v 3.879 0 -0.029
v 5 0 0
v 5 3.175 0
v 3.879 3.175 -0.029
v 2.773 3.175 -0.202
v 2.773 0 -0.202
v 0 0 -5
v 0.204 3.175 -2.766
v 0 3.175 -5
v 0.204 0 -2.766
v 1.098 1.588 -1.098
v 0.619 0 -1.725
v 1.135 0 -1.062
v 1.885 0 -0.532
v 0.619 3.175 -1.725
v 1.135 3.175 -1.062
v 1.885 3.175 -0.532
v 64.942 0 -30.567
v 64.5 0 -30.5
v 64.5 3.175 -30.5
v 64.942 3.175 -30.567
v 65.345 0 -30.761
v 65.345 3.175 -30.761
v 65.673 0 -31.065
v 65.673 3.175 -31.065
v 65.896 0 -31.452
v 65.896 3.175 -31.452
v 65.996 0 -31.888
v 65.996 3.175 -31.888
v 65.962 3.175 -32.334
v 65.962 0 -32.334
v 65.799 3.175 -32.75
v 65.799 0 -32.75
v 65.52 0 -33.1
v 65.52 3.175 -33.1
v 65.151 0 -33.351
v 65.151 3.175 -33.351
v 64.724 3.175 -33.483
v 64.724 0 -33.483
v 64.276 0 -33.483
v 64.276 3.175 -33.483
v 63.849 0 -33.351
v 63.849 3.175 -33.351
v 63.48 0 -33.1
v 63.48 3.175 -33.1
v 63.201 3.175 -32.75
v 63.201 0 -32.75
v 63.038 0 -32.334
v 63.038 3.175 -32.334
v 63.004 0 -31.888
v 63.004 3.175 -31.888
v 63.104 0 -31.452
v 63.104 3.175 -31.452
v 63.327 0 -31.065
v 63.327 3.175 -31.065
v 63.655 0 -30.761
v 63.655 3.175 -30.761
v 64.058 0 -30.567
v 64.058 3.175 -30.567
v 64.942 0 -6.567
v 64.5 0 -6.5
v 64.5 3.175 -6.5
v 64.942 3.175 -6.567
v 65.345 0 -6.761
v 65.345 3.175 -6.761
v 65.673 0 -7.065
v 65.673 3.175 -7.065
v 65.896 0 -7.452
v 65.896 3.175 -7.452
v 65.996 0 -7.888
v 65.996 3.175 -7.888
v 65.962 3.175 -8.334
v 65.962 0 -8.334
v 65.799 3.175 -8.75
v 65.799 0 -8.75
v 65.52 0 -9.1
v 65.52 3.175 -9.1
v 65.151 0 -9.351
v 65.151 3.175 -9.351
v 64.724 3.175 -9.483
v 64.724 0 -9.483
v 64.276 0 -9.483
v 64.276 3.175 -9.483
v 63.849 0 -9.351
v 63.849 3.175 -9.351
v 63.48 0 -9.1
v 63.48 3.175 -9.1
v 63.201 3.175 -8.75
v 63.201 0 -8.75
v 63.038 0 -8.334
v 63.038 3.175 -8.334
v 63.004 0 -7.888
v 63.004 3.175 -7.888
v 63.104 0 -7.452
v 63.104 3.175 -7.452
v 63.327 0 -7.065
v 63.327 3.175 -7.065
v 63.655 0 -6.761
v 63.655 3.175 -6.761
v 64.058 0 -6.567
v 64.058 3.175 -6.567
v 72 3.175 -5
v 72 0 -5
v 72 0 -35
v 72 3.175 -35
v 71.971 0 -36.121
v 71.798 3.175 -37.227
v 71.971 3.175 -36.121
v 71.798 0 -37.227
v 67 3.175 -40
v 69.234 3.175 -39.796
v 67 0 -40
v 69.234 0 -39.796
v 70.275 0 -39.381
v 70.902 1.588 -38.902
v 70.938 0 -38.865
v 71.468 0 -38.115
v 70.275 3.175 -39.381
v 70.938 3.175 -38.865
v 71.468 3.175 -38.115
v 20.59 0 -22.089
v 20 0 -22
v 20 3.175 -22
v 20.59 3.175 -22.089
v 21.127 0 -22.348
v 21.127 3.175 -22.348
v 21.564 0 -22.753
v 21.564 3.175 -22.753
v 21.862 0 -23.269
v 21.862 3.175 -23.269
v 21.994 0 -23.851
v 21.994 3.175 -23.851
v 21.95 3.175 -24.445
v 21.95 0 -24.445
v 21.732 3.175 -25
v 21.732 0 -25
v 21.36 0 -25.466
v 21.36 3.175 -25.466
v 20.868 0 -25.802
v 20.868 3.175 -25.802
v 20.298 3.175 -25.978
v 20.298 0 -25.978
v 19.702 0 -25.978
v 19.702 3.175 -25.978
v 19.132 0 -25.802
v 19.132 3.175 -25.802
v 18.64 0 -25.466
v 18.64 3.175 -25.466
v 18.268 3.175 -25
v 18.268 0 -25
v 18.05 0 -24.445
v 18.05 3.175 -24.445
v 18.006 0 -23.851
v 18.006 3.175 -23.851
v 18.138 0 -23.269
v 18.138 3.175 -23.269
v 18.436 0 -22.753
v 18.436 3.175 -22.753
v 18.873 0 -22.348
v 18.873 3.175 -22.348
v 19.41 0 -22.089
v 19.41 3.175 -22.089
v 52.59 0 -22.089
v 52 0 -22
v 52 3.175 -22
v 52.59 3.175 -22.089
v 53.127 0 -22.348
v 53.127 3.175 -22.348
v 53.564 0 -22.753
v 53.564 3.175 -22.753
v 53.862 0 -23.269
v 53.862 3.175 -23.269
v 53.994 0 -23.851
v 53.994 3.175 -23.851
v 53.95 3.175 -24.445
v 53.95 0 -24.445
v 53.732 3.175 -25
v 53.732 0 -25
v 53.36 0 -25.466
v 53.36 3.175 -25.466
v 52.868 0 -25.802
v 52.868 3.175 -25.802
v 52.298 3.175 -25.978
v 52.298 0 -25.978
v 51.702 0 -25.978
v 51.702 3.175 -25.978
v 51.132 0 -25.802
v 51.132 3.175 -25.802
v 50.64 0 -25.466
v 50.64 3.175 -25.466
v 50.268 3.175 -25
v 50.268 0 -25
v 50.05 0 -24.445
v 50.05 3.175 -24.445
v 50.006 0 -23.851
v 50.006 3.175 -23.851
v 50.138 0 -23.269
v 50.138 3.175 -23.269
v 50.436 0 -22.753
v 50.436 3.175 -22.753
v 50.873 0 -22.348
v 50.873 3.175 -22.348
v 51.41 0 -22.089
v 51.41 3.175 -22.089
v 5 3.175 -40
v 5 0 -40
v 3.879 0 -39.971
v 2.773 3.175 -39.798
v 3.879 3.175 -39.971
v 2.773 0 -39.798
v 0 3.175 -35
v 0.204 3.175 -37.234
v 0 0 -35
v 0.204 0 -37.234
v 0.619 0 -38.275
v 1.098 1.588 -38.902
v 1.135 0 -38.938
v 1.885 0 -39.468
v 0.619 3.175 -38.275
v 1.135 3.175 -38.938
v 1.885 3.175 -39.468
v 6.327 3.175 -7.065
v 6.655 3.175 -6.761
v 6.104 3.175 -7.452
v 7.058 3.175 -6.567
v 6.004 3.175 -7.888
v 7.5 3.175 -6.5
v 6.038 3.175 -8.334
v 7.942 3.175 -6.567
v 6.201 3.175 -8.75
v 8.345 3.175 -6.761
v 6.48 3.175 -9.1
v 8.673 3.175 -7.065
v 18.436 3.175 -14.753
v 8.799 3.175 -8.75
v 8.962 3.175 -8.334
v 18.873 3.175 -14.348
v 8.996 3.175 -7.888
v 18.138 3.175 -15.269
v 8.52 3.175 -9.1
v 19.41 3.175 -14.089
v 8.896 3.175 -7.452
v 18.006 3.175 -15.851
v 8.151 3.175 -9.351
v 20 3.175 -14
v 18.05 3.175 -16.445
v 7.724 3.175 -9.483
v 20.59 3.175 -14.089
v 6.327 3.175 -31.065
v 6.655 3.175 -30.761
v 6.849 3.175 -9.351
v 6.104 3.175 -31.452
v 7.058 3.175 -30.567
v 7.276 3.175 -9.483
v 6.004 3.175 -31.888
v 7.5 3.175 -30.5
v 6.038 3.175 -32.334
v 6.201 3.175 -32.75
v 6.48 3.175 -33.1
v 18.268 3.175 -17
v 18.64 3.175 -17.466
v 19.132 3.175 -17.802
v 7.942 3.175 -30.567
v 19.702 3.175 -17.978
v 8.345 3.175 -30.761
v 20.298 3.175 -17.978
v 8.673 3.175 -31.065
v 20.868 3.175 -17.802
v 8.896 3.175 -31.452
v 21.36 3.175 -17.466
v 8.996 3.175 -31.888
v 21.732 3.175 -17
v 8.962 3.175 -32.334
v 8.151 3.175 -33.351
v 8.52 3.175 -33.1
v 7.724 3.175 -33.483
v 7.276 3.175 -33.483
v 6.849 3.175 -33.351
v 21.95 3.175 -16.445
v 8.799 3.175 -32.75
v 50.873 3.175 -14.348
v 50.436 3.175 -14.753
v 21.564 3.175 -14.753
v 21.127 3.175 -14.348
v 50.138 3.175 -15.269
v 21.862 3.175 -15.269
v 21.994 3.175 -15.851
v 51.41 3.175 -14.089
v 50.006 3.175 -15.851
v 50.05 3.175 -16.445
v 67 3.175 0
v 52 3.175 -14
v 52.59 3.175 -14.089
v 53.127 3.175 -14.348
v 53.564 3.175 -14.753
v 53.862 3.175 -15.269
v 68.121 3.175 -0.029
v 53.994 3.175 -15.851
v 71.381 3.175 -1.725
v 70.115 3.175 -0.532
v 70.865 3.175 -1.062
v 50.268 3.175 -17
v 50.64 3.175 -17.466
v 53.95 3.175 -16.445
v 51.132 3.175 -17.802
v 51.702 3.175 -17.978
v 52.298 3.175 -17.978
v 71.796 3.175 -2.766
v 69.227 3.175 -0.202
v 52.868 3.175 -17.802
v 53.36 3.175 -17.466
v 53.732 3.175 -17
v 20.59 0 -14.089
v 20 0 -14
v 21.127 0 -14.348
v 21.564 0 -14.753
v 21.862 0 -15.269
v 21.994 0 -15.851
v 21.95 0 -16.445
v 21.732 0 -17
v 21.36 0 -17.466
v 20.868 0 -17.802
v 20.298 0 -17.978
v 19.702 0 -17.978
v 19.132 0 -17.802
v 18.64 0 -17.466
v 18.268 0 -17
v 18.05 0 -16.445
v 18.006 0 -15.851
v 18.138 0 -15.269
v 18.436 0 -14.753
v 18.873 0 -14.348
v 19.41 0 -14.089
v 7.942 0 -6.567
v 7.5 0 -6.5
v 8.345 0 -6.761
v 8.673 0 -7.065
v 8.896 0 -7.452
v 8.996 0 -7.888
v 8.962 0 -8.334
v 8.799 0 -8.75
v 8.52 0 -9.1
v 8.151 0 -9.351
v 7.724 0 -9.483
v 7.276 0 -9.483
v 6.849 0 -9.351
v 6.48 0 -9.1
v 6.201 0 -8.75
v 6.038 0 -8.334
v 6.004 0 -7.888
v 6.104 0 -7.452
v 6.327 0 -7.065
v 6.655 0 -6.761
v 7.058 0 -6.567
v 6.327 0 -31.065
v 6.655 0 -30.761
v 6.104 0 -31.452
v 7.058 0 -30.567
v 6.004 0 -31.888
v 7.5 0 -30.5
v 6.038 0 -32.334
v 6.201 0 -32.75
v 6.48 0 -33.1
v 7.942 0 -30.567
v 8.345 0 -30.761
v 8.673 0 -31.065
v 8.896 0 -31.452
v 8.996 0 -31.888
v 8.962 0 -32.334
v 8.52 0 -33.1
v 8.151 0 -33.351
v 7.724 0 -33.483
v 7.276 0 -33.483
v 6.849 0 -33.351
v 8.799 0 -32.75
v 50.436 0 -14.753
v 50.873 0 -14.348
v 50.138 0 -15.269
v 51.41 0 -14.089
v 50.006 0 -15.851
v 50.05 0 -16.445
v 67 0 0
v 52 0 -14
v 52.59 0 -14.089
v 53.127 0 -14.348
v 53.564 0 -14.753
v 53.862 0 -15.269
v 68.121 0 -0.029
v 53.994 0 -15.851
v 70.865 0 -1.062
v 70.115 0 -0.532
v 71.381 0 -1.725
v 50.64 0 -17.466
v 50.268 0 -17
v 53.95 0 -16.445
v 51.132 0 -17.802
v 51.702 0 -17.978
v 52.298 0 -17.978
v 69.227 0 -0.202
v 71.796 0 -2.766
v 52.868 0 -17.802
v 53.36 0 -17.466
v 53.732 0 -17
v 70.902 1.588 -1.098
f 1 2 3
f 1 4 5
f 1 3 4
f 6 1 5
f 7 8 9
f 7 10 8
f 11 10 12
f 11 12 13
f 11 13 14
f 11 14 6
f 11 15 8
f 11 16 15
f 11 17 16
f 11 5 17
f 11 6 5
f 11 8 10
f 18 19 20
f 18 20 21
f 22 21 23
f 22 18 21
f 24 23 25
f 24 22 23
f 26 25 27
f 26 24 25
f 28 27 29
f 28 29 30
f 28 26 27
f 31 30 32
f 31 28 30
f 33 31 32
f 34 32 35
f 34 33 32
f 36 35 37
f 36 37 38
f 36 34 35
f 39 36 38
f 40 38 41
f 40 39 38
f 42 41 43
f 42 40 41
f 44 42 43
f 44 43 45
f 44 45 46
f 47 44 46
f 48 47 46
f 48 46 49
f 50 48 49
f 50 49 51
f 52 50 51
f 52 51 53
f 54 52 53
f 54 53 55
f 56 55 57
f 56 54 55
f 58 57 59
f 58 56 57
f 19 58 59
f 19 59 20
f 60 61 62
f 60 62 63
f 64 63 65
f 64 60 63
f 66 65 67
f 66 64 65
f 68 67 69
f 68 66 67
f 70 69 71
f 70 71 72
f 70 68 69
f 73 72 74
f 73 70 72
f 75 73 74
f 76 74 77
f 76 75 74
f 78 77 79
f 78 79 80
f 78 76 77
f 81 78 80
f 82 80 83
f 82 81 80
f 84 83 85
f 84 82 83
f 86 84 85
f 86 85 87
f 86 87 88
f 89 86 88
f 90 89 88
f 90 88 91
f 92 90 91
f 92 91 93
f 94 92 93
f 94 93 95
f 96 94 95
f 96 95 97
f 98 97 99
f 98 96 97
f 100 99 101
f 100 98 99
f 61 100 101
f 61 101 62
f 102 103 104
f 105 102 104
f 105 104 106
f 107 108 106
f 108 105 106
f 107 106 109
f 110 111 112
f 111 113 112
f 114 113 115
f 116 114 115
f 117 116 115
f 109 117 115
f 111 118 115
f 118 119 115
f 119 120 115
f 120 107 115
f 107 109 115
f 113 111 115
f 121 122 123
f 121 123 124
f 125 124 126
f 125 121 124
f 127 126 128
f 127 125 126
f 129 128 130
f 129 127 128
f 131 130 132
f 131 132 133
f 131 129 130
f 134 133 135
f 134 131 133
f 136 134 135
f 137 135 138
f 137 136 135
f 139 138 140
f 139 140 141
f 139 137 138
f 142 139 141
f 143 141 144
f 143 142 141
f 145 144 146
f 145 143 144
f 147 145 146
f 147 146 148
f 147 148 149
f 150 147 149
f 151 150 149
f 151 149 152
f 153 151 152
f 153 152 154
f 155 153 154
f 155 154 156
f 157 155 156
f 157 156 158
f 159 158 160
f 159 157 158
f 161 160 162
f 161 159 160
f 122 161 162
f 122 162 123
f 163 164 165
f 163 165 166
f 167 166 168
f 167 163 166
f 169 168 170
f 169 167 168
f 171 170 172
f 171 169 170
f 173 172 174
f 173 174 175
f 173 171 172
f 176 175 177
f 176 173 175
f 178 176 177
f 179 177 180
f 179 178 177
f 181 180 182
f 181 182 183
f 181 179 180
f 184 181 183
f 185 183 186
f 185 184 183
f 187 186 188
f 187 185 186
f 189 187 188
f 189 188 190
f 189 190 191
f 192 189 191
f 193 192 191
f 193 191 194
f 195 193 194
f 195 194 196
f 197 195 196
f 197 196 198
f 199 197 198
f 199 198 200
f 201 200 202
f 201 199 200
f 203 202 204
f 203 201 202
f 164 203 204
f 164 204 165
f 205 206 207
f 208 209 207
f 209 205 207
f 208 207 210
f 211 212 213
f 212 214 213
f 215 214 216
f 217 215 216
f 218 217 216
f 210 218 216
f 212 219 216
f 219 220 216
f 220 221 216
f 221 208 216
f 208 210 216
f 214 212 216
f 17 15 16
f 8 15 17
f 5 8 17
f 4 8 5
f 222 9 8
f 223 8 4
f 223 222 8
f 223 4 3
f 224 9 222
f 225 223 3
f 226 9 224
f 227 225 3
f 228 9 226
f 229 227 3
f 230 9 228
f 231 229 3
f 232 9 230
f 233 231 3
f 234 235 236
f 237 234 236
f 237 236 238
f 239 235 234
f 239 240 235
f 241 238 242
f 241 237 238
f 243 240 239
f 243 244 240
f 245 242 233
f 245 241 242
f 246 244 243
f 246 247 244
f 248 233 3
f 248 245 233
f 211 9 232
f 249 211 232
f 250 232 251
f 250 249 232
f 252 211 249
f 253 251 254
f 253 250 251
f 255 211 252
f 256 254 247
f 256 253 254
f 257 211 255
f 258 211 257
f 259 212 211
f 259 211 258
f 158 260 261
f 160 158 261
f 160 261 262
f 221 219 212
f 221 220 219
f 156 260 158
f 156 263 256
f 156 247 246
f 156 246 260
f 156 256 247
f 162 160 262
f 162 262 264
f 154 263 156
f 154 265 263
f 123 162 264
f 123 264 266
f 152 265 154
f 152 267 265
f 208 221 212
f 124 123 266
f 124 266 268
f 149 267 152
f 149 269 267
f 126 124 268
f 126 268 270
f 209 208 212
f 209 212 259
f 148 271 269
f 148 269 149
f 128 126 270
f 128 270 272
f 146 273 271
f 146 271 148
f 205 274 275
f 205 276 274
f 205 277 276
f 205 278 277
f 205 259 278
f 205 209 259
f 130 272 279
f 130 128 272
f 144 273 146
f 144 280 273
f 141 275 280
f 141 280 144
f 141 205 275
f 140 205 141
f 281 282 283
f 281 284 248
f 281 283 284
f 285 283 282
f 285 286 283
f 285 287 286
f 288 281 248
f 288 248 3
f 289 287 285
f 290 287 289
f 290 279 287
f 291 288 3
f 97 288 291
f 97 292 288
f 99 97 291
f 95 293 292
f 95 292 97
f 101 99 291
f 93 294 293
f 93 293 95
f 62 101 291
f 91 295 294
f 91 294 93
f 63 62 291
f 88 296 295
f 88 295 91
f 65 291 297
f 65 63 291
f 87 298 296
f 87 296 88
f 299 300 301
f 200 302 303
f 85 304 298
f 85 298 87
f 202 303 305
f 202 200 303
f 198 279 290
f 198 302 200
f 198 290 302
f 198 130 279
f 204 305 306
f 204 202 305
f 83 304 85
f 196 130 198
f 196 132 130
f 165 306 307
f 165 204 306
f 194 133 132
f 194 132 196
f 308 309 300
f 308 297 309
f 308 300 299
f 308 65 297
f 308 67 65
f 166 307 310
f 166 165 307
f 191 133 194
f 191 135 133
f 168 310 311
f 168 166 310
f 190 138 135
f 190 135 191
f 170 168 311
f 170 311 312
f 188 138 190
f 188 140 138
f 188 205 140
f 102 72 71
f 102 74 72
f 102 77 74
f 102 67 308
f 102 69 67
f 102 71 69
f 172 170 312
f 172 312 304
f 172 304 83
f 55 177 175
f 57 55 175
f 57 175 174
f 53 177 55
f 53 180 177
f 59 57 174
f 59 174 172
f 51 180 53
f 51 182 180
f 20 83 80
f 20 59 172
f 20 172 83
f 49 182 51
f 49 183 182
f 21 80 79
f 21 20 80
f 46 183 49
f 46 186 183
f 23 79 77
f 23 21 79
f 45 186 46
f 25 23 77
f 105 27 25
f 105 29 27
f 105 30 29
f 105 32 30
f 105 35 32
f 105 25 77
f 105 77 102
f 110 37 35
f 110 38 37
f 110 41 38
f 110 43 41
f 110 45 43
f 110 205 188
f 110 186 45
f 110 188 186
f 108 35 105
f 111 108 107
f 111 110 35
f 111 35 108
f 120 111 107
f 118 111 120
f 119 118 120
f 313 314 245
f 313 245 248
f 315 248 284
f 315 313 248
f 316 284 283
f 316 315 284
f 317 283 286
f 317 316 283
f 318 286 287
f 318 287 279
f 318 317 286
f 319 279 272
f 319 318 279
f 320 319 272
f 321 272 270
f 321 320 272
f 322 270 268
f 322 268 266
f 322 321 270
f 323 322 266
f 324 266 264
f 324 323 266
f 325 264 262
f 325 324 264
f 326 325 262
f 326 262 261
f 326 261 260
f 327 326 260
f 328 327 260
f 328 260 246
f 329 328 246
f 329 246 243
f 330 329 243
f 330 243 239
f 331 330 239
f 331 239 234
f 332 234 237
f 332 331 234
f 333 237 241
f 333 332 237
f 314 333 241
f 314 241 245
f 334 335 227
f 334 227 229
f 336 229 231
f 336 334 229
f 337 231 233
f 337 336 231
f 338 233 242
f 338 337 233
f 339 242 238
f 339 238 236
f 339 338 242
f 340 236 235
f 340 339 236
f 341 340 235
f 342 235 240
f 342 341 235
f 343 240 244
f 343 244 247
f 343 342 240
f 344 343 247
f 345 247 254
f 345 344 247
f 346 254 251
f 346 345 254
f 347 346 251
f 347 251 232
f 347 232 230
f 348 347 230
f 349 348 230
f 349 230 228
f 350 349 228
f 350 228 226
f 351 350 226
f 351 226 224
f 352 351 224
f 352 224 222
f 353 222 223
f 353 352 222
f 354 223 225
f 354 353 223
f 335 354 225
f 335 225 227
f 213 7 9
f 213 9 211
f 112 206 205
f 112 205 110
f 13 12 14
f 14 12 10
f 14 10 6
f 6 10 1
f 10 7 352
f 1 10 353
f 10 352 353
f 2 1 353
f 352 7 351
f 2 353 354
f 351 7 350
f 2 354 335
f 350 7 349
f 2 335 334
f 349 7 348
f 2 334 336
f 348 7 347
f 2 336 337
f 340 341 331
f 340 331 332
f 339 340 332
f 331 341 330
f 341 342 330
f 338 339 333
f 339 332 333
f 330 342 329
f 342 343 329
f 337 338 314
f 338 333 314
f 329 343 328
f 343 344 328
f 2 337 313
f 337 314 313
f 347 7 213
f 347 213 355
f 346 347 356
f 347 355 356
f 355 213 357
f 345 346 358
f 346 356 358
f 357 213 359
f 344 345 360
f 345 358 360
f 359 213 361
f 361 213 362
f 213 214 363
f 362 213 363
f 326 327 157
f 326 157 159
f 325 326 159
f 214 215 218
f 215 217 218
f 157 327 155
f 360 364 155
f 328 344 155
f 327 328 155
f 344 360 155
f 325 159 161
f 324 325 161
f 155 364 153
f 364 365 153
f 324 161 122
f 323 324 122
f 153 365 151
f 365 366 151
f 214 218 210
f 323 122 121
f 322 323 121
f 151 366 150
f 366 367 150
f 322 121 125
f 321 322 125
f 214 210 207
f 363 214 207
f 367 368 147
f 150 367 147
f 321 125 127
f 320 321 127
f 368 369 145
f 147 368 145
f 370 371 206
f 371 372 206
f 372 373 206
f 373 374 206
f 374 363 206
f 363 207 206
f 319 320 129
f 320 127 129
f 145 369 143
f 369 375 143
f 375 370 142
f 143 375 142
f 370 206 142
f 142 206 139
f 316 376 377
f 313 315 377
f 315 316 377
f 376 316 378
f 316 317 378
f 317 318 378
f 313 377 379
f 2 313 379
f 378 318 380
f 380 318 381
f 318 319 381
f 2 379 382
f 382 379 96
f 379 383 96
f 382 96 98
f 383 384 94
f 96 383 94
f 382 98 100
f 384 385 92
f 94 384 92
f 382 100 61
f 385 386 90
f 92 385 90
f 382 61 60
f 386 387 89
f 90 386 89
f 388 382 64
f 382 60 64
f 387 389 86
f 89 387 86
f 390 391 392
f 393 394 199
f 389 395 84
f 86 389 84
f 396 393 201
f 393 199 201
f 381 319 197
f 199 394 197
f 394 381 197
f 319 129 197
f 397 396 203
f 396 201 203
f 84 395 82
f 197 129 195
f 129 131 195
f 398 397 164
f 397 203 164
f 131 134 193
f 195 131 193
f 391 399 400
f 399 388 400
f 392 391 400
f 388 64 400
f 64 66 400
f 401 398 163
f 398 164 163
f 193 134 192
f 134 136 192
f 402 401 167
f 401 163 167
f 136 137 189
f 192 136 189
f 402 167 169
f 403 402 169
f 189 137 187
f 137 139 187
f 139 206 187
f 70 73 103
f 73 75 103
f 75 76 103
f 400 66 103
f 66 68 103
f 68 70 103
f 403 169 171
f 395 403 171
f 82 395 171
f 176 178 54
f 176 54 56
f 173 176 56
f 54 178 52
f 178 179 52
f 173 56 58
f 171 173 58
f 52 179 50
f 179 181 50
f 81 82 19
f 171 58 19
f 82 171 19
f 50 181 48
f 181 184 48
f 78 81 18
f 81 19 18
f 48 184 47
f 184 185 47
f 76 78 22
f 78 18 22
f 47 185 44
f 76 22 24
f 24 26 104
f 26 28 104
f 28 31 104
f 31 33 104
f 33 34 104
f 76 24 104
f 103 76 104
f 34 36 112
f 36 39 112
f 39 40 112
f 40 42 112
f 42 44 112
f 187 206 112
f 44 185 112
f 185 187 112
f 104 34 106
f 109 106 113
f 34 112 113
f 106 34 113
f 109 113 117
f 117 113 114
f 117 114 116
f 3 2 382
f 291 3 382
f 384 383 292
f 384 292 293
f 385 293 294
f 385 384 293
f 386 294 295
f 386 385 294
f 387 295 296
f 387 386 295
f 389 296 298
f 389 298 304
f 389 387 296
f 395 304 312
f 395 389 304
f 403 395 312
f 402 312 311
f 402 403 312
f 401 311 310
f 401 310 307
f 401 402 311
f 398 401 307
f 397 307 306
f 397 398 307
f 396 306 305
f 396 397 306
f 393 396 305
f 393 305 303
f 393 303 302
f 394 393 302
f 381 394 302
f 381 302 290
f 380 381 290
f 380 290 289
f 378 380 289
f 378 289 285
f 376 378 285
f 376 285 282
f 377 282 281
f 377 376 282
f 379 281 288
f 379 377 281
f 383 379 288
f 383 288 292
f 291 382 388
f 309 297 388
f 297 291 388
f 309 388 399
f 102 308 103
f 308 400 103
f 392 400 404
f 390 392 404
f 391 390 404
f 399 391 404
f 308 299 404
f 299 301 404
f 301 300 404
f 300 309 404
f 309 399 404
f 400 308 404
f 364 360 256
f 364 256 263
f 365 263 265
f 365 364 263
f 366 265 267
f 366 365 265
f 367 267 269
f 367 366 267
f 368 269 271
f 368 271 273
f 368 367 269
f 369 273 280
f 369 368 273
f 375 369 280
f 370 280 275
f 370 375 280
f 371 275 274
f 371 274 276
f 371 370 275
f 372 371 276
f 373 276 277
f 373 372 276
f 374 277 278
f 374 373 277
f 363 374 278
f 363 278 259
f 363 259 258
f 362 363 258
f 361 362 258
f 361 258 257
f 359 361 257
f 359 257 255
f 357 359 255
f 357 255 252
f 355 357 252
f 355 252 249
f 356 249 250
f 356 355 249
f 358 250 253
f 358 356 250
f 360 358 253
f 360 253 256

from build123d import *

# Parameters (mm, degrees)
SKETCH1_W           = 72
SKETCH1_H           = 40
SKETCH1_R           = 2
SKETCH1_R_2         = 1.5
BOSS_EXTRUDE1_DEPTH = 3.175
FILLET1_SIZE        = 5


with BuildPart() as part:
    # Sketch1 → Boss-Extrude1 (new body)
    with BuildSketch(Plane(origin=(0, 0, 0), x_dir=(1, 0, 0), z_dir=(0, 1, 0))):
        with Locations((36, 20)):
            Rectangle(SKETCH1_W, SKETCH1_H)
        with Locations(Location((20, 24, 0), (0, 0, 270))):
            Circle(SKETCH1_R, mode=Mode.SUBTRACT)
        with Locations(Location((20, 16, 0), (0, 0, 270))):
            Circle(SKETCH1_R, mode=Mode.SUBTRACT)
        with Locations(Location((52, 24, 0), (0, 0, 270))):
            Circle(SKETCH1_R, mode=Mode.SUBTRACT)
        with Locations(Location((52, 16, 0), (0, 0, 270))):
            Circle(SKETCH1_R, mode=Mode.SUBTRACT)
        with Locations(Location((7.5, 32, 0), (0, 0, 270))):
            Circle(SKETCH1_R_2, mode=Mode.SUBTRACT)
        with Locations(Location((7.5, 8, 0), (0, 0, 270))):
            Circle(SKETCH1_R_2, mode=Mode.SUBTRACT)
        with Locations(Location((64.5, 8, 0), (0, 0, 270))):
            Circle(SKETCH1_R_2, mode=Mode.SUBTRACT)
        with Locations(Location((64.5, 32, 0), (0, 0, 270))):
            Circle(SKETCH1_R_2, mode=Mode.SUBTRACT)
    extrude(amount=BOSS_EXTRUDE1_DEPTH)

    # Fillet1
    # a fillet whose section is not a circle: 5 mm, written as the material it takes off along each edge
    with BuildSketch(Plane(origin=(0, -12.5, -40), x_dir=(1, 0, 0), z_dir=(0, 1, 0)), Plane(origin=(72, -12.5, 0), x_dir=(-1, 0, 0), z_dir=(0, 1, 0)), Plane(origin=(72, -12.5, -40), x_dir=(0, 0, 1), z_dir=(0, 1, 0))) as fillet1_piece_1:
        with BuildLine():
            add(Edge.make_bspline([(FILLET1_SIZE, 0), (FILLET1_SIZE * 0.831801948466, 0), (FILLET1_SIZE * 0.663603896932, 0), (FILLET1_SIZE * 0.292893218813, -FILLET1_SIZE * 0.0716919198361), (FILLET1_SIZE * 0.0716919198361, -FILLET1_SIZE * 0.292893218813), (0, -FILLET1_SIZE * 0.663603896932), (0, -FILLET1_SIZE * 0.831801948466), (0, -FILLET1_SIZE)], knots=[0, 0, 0, 0, 0, 0, 0.5, 0.5, 1, 1, 1, 1, 1, 1], degree=5))
            Line((0, -FILLET1_SIZE), (0, 0))
            Line((0, 0), (FILLET1_SIZE, 0))
        make_face()
    extrude(amount=28.175, mode=Mode.SUBTRACT)
    with BuildSketch(Plane(origin=(0, -12.5, 0), x_dir=(1, 0, 0), z_dir=(0, 1, 0))) as fillet1_piece_2:
        with BuildLine():
            add(Edge.make_bspline([(FILLET1_SIZE, 0), (FILLET1_SIZE * 0.831801948466, 0), (FILLET1_SIZE * 0.663603896932, 0), (FILLET1_SIZE * 0.292893218813, FILLET1_SIZE * 0.0716919198361), (FILLET1_SIZE * 0.0716919198361, FILLET1_SIZE * 0.292893218813), (0, FILLET1_SIZE * 0.663603896932), (0, FILLET1_SIZE * 0.831801948466), (0, FILLET1_SIZE)], knots=[0, 0, 0, 0, 0, 0, 0.5, 0.5, 1, 1, 1, 1, 1, 1], degree=5))
            Line((0, FILLET1_SIZE), (0, 0))
            Line((0, 0), (FILLET1_SIZE, 0))
        make_face()
    extrude(amount=28.175, mode=Mode.SUBTRACT)


solid = part.part
